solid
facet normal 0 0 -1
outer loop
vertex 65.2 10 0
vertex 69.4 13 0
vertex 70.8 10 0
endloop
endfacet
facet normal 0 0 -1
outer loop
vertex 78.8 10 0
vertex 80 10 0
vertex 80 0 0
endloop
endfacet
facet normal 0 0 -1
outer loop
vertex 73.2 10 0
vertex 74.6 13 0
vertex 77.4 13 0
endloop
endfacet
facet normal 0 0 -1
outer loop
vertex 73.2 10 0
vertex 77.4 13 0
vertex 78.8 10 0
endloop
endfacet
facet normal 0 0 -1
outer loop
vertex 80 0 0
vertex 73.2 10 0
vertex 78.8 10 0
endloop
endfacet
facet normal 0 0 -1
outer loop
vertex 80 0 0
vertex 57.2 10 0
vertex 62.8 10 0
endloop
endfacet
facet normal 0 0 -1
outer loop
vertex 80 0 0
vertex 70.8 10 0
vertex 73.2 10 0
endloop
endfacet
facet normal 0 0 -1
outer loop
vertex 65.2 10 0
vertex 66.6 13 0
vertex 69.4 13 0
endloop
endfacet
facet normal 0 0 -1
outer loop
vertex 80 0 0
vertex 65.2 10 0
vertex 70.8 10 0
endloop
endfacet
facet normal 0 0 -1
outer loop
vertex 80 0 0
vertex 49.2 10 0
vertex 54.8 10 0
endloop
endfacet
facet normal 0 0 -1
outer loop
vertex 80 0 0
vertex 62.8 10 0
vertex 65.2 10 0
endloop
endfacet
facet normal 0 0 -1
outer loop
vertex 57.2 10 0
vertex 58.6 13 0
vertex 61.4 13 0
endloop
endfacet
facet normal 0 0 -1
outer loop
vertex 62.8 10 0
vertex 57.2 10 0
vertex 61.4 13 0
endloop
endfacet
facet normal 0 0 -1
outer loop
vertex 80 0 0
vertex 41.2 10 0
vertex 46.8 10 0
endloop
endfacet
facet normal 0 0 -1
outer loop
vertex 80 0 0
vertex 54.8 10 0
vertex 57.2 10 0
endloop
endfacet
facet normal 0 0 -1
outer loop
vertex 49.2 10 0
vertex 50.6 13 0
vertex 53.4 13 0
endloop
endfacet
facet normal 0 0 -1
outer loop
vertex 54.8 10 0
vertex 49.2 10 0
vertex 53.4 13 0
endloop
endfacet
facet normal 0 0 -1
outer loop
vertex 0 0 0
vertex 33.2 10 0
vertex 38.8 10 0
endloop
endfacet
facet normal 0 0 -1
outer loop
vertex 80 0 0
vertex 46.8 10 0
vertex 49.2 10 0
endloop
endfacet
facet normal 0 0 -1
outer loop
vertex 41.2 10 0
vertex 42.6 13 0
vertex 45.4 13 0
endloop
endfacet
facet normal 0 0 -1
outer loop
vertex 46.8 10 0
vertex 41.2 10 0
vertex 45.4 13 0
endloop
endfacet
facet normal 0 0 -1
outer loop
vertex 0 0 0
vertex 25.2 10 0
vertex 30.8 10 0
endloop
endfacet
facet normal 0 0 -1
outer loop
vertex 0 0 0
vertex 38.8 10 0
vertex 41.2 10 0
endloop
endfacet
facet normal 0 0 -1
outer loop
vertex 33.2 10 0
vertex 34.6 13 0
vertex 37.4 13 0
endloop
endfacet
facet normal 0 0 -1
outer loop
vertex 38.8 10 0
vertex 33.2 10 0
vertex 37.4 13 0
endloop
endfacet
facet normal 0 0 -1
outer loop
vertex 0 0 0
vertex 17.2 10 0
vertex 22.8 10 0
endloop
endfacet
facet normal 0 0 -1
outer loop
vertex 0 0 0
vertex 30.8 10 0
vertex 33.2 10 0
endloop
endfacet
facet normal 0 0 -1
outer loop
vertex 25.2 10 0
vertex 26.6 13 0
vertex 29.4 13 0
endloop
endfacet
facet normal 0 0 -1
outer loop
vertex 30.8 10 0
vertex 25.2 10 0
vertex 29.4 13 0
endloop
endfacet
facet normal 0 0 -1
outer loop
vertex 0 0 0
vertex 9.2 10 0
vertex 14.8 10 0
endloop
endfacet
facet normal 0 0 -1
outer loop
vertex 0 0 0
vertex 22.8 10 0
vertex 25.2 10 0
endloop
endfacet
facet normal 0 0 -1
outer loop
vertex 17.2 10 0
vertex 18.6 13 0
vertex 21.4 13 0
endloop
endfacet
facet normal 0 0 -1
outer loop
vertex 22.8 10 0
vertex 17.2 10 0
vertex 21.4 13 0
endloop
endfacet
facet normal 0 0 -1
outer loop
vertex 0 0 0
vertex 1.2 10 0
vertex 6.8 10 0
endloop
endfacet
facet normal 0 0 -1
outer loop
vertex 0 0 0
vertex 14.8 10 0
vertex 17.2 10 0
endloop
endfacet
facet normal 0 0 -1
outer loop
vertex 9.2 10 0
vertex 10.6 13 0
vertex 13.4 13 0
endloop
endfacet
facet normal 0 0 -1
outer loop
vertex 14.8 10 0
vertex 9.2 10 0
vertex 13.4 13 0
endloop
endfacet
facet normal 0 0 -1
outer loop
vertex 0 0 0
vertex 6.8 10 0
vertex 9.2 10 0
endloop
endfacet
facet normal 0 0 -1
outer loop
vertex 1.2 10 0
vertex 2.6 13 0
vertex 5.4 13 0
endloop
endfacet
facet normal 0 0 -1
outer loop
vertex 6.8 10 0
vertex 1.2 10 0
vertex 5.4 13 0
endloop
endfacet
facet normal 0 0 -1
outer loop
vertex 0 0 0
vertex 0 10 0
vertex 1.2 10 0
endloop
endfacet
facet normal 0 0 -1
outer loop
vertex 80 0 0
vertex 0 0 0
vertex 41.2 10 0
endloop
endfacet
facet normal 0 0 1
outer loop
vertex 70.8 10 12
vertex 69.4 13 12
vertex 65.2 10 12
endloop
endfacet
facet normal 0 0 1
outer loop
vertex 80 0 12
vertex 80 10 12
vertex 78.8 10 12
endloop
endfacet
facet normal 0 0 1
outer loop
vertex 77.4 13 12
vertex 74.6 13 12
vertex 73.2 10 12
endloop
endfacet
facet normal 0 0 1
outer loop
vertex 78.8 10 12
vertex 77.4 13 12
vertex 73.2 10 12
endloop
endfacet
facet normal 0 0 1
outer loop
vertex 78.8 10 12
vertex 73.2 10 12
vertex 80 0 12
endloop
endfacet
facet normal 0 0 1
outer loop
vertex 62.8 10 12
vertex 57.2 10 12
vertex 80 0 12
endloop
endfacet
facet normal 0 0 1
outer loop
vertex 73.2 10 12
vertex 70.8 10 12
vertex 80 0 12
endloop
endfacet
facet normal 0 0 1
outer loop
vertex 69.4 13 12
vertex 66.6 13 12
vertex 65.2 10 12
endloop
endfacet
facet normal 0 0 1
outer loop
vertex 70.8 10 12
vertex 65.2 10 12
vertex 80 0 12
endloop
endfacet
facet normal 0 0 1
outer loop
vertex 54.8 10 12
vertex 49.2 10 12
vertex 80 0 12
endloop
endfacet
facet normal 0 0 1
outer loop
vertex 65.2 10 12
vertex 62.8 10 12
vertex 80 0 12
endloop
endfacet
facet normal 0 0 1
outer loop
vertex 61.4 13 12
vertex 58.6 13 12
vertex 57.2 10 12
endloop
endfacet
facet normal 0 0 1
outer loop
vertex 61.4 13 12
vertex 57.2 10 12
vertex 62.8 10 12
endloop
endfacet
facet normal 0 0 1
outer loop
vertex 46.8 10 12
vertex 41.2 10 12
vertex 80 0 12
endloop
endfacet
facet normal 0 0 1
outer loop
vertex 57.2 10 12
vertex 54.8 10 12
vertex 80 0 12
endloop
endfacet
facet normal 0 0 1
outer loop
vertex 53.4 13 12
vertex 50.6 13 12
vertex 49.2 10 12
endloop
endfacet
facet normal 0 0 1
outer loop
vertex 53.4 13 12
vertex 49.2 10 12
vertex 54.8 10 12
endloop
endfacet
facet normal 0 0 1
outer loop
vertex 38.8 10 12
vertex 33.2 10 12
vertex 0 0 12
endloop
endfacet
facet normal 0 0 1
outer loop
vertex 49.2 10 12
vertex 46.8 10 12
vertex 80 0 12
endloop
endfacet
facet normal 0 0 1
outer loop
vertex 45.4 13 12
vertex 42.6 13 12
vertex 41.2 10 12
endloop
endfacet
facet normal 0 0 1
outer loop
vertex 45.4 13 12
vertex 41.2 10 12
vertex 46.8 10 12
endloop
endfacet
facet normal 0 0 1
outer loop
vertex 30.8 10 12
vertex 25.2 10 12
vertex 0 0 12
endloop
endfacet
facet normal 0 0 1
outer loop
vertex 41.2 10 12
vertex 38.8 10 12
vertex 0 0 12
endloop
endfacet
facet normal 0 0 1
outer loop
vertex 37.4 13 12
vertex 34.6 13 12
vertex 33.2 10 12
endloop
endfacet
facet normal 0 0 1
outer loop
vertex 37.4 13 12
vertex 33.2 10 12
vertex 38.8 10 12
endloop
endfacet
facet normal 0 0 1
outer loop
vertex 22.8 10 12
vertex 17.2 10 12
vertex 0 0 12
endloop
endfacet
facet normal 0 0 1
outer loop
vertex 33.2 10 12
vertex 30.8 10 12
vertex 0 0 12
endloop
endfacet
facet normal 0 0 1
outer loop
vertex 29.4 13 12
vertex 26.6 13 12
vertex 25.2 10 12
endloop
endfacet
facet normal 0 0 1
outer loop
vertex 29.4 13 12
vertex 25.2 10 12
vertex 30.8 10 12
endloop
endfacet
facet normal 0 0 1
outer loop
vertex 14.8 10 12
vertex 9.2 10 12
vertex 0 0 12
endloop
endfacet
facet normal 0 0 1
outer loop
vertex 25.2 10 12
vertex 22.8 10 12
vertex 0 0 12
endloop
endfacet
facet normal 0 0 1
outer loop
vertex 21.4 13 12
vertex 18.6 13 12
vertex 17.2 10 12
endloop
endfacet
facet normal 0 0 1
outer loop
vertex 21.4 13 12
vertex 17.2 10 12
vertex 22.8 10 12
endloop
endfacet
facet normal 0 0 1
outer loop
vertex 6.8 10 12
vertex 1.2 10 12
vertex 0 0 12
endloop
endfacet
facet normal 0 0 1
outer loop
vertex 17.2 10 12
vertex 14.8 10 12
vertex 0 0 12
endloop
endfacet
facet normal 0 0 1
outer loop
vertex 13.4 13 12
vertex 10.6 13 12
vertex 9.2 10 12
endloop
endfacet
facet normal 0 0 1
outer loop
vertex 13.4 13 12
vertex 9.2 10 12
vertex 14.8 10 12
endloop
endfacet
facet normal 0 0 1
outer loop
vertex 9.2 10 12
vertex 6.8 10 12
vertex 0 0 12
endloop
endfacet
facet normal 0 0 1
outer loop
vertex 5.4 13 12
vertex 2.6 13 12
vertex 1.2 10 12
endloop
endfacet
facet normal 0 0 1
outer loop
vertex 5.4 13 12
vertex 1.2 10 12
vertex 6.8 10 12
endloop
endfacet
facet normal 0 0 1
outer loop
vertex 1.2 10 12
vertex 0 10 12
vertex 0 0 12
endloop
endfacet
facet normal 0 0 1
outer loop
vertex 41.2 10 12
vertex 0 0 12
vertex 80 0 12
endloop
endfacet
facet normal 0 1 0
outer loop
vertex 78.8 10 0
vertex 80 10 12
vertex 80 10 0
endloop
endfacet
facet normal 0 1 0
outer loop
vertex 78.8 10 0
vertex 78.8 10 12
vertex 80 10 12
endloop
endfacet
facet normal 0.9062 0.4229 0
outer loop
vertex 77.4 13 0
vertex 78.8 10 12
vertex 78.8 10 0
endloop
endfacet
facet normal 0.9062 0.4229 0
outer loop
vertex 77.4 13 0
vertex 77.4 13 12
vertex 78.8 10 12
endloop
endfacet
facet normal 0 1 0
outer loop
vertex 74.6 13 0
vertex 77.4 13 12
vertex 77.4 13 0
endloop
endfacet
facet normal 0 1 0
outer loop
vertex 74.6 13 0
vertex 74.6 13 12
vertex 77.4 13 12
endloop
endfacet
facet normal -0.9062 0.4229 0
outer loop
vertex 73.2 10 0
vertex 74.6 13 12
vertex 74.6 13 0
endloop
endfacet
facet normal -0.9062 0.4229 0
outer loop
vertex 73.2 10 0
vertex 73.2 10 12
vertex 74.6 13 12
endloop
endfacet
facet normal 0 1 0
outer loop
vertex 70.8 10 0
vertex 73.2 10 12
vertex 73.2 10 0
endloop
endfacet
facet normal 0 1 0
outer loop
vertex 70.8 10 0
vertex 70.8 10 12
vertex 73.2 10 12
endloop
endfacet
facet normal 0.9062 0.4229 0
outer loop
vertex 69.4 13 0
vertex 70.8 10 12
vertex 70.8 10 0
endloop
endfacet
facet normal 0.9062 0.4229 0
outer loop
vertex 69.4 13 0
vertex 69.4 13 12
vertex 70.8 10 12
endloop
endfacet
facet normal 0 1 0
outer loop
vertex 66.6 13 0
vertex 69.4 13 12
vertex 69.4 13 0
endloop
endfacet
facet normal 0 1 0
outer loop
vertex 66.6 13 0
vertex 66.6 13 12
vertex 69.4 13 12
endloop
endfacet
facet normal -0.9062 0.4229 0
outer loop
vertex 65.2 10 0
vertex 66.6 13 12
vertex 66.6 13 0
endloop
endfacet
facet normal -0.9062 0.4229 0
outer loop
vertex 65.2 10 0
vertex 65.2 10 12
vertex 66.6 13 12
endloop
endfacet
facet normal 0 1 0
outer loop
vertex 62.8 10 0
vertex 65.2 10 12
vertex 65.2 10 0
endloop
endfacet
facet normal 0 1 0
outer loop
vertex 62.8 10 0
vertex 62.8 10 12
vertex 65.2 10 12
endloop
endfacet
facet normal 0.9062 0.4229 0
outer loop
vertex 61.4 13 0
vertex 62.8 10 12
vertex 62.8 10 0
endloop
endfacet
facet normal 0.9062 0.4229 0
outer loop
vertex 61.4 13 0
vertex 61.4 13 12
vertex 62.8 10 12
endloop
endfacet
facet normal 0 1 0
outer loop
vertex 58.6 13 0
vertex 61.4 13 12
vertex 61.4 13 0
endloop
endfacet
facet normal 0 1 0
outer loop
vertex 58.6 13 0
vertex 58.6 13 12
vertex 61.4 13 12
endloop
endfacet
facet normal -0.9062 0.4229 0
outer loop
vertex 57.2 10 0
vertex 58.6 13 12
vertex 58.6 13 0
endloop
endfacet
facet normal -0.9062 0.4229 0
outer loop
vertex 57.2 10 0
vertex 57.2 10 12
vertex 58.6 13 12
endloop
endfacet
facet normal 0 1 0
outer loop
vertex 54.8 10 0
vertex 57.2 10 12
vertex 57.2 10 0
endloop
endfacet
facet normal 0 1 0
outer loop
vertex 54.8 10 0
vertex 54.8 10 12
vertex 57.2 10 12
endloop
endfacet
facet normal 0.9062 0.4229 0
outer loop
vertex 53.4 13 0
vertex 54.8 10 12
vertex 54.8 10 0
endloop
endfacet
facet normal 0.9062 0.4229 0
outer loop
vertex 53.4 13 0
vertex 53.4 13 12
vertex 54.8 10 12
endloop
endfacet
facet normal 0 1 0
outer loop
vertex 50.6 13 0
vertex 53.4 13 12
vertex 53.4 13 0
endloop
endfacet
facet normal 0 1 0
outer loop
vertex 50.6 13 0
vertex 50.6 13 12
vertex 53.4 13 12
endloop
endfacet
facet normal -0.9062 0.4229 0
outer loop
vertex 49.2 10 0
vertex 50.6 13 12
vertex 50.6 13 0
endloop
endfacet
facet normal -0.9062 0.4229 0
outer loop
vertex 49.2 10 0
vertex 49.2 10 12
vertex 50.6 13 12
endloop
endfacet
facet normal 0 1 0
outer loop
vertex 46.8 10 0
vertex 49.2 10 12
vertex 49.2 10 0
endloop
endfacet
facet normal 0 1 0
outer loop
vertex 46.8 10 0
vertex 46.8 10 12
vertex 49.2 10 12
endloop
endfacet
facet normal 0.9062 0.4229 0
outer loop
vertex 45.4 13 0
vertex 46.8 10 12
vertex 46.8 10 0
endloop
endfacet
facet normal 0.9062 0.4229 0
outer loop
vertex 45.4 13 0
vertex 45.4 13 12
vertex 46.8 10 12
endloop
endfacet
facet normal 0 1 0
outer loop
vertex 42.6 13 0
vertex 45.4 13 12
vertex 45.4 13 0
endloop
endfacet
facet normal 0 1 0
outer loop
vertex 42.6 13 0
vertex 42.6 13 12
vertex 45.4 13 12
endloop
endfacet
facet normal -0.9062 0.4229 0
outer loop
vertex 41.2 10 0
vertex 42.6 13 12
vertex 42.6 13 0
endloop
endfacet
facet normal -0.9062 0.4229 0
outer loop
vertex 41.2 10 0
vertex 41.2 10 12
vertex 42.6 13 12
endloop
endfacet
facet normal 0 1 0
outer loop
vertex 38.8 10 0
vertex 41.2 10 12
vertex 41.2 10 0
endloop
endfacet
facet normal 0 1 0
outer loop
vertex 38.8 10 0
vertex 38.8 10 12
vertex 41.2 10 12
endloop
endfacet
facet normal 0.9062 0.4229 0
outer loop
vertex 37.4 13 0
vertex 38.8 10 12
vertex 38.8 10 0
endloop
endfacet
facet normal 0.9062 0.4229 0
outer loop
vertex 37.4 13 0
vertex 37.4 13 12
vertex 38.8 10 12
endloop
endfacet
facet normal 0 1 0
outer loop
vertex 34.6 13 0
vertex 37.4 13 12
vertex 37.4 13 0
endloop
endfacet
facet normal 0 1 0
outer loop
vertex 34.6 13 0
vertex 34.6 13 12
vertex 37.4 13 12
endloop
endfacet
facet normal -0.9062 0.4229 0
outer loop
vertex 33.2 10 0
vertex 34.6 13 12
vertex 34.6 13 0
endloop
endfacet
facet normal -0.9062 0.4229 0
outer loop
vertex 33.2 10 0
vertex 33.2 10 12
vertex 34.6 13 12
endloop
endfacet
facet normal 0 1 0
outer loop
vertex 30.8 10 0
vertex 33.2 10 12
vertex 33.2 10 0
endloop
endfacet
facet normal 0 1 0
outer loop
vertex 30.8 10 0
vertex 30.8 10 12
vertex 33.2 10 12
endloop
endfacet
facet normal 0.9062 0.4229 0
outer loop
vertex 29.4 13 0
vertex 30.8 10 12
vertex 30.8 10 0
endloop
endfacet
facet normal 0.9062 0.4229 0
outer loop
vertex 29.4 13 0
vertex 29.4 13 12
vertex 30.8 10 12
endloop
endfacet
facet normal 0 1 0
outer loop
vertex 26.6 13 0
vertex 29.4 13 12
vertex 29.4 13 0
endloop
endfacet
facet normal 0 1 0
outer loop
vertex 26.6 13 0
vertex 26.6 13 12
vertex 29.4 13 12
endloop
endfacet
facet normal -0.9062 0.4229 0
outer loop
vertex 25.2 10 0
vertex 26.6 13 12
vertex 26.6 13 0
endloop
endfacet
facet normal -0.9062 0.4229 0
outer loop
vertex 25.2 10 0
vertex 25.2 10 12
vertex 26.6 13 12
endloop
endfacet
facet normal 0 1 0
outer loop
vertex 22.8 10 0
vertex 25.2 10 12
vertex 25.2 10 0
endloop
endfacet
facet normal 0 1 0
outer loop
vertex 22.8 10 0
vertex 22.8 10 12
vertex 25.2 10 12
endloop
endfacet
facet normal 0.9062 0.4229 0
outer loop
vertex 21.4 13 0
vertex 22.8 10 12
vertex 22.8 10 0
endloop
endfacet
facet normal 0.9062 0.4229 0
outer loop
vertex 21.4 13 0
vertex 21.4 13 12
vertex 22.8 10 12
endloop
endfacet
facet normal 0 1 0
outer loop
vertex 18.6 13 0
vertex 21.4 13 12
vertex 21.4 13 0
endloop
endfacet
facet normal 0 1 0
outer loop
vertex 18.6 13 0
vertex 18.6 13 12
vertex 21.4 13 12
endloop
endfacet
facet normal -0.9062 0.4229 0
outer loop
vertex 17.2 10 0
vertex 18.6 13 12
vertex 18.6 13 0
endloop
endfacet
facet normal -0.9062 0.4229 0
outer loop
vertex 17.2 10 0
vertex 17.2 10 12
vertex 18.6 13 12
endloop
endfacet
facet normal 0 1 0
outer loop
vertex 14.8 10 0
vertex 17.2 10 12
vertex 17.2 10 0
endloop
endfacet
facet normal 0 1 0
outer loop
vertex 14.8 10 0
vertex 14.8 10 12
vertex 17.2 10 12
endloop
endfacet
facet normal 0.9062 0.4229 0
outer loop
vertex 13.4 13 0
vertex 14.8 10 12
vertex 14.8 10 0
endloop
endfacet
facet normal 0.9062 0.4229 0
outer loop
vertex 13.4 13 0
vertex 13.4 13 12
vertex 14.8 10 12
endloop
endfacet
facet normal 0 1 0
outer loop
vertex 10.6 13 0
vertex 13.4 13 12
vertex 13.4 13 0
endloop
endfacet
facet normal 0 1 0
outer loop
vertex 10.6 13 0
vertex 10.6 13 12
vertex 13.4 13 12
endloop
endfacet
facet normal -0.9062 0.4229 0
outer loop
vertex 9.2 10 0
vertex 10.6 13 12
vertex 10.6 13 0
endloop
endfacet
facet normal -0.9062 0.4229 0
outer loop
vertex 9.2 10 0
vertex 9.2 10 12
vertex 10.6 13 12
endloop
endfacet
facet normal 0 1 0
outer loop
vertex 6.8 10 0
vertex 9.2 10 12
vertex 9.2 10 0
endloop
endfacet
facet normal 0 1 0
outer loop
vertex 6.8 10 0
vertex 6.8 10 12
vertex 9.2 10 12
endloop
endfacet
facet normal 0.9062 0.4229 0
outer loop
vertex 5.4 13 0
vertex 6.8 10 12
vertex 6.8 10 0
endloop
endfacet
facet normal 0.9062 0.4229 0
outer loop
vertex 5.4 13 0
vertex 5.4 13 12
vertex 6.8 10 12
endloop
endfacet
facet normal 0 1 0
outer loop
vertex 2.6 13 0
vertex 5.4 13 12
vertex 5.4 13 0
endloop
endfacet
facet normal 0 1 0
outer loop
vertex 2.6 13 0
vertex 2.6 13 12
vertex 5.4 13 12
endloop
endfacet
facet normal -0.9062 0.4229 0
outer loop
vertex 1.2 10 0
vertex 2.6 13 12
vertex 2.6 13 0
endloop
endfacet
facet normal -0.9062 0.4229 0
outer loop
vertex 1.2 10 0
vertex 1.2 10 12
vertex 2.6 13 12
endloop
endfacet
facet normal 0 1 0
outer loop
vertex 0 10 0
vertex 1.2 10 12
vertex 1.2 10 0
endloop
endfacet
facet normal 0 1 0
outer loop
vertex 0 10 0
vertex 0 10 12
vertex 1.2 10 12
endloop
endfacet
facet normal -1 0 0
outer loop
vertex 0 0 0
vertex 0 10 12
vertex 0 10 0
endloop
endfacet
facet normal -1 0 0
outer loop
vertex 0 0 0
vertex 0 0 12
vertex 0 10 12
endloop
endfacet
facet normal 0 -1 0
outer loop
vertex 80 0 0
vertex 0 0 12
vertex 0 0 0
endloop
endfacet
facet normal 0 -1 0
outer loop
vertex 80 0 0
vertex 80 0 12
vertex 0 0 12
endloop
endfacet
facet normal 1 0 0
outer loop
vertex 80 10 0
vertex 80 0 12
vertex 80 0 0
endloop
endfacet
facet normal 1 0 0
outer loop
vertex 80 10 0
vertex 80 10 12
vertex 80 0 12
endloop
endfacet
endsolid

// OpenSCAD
$fn = 32;

// ----------------------------------------------------------------------
// Gear rack: 10 teeth, pitch 8 mm
// ----------------------------------------------------------------------

// --- parameters (mm) ---
teeth = 10;               // number of teeth
pitch = 8;                // tooth pitch, X
root_w = 5.6;             // tooth width at the root
tip_w = 2.8;              // tooth width at the tip
base_h = 10;              // rack body height, Y
tooth_h = 3;              // tooth height above the body
plate_t = 12;             // rack width, Z (extrusion height)

rack_l = teeth * pitch;  // overall length
total_h = base_h + tooth_h;  // overall height

profile = [[0, 0], [80, 0], [80, 10], [78.8, 10], [77.4, 13], [74.6, 13], [73.2, 10], [70.8, 10], [69.4, 13], [66.6, 13], [65.2, 10], [62.8, 10], [61.4, 13], [58.6, 13], [57.2, 10], [54.8, 10], [53.4, 13], [50.6, 13], [49.2, 10], [46.8, 10], [45.4, 13], [42.6, 13], [41.2, 10], [38.8, 10], [37.4, 13], [34.6, 13], [33.2, 10], [30.8, 10], [29.4, 13], [26.6, 13], [25.2, 10], [22.8, 10], [21.4, 13], [18.6, 13], [17.2, 10], [14.8, 10], [13.4, 13], [10.6, 13], [9.2, 10], [6.8, 10], [5.4, 13], [2.6, 13], [1.2, 10], [0, 10]];  // primary outline, 44 points, counter clockwise

// --- the one profile operation ---
linear_extrude(height = plate_t) polygon(points = profile);
